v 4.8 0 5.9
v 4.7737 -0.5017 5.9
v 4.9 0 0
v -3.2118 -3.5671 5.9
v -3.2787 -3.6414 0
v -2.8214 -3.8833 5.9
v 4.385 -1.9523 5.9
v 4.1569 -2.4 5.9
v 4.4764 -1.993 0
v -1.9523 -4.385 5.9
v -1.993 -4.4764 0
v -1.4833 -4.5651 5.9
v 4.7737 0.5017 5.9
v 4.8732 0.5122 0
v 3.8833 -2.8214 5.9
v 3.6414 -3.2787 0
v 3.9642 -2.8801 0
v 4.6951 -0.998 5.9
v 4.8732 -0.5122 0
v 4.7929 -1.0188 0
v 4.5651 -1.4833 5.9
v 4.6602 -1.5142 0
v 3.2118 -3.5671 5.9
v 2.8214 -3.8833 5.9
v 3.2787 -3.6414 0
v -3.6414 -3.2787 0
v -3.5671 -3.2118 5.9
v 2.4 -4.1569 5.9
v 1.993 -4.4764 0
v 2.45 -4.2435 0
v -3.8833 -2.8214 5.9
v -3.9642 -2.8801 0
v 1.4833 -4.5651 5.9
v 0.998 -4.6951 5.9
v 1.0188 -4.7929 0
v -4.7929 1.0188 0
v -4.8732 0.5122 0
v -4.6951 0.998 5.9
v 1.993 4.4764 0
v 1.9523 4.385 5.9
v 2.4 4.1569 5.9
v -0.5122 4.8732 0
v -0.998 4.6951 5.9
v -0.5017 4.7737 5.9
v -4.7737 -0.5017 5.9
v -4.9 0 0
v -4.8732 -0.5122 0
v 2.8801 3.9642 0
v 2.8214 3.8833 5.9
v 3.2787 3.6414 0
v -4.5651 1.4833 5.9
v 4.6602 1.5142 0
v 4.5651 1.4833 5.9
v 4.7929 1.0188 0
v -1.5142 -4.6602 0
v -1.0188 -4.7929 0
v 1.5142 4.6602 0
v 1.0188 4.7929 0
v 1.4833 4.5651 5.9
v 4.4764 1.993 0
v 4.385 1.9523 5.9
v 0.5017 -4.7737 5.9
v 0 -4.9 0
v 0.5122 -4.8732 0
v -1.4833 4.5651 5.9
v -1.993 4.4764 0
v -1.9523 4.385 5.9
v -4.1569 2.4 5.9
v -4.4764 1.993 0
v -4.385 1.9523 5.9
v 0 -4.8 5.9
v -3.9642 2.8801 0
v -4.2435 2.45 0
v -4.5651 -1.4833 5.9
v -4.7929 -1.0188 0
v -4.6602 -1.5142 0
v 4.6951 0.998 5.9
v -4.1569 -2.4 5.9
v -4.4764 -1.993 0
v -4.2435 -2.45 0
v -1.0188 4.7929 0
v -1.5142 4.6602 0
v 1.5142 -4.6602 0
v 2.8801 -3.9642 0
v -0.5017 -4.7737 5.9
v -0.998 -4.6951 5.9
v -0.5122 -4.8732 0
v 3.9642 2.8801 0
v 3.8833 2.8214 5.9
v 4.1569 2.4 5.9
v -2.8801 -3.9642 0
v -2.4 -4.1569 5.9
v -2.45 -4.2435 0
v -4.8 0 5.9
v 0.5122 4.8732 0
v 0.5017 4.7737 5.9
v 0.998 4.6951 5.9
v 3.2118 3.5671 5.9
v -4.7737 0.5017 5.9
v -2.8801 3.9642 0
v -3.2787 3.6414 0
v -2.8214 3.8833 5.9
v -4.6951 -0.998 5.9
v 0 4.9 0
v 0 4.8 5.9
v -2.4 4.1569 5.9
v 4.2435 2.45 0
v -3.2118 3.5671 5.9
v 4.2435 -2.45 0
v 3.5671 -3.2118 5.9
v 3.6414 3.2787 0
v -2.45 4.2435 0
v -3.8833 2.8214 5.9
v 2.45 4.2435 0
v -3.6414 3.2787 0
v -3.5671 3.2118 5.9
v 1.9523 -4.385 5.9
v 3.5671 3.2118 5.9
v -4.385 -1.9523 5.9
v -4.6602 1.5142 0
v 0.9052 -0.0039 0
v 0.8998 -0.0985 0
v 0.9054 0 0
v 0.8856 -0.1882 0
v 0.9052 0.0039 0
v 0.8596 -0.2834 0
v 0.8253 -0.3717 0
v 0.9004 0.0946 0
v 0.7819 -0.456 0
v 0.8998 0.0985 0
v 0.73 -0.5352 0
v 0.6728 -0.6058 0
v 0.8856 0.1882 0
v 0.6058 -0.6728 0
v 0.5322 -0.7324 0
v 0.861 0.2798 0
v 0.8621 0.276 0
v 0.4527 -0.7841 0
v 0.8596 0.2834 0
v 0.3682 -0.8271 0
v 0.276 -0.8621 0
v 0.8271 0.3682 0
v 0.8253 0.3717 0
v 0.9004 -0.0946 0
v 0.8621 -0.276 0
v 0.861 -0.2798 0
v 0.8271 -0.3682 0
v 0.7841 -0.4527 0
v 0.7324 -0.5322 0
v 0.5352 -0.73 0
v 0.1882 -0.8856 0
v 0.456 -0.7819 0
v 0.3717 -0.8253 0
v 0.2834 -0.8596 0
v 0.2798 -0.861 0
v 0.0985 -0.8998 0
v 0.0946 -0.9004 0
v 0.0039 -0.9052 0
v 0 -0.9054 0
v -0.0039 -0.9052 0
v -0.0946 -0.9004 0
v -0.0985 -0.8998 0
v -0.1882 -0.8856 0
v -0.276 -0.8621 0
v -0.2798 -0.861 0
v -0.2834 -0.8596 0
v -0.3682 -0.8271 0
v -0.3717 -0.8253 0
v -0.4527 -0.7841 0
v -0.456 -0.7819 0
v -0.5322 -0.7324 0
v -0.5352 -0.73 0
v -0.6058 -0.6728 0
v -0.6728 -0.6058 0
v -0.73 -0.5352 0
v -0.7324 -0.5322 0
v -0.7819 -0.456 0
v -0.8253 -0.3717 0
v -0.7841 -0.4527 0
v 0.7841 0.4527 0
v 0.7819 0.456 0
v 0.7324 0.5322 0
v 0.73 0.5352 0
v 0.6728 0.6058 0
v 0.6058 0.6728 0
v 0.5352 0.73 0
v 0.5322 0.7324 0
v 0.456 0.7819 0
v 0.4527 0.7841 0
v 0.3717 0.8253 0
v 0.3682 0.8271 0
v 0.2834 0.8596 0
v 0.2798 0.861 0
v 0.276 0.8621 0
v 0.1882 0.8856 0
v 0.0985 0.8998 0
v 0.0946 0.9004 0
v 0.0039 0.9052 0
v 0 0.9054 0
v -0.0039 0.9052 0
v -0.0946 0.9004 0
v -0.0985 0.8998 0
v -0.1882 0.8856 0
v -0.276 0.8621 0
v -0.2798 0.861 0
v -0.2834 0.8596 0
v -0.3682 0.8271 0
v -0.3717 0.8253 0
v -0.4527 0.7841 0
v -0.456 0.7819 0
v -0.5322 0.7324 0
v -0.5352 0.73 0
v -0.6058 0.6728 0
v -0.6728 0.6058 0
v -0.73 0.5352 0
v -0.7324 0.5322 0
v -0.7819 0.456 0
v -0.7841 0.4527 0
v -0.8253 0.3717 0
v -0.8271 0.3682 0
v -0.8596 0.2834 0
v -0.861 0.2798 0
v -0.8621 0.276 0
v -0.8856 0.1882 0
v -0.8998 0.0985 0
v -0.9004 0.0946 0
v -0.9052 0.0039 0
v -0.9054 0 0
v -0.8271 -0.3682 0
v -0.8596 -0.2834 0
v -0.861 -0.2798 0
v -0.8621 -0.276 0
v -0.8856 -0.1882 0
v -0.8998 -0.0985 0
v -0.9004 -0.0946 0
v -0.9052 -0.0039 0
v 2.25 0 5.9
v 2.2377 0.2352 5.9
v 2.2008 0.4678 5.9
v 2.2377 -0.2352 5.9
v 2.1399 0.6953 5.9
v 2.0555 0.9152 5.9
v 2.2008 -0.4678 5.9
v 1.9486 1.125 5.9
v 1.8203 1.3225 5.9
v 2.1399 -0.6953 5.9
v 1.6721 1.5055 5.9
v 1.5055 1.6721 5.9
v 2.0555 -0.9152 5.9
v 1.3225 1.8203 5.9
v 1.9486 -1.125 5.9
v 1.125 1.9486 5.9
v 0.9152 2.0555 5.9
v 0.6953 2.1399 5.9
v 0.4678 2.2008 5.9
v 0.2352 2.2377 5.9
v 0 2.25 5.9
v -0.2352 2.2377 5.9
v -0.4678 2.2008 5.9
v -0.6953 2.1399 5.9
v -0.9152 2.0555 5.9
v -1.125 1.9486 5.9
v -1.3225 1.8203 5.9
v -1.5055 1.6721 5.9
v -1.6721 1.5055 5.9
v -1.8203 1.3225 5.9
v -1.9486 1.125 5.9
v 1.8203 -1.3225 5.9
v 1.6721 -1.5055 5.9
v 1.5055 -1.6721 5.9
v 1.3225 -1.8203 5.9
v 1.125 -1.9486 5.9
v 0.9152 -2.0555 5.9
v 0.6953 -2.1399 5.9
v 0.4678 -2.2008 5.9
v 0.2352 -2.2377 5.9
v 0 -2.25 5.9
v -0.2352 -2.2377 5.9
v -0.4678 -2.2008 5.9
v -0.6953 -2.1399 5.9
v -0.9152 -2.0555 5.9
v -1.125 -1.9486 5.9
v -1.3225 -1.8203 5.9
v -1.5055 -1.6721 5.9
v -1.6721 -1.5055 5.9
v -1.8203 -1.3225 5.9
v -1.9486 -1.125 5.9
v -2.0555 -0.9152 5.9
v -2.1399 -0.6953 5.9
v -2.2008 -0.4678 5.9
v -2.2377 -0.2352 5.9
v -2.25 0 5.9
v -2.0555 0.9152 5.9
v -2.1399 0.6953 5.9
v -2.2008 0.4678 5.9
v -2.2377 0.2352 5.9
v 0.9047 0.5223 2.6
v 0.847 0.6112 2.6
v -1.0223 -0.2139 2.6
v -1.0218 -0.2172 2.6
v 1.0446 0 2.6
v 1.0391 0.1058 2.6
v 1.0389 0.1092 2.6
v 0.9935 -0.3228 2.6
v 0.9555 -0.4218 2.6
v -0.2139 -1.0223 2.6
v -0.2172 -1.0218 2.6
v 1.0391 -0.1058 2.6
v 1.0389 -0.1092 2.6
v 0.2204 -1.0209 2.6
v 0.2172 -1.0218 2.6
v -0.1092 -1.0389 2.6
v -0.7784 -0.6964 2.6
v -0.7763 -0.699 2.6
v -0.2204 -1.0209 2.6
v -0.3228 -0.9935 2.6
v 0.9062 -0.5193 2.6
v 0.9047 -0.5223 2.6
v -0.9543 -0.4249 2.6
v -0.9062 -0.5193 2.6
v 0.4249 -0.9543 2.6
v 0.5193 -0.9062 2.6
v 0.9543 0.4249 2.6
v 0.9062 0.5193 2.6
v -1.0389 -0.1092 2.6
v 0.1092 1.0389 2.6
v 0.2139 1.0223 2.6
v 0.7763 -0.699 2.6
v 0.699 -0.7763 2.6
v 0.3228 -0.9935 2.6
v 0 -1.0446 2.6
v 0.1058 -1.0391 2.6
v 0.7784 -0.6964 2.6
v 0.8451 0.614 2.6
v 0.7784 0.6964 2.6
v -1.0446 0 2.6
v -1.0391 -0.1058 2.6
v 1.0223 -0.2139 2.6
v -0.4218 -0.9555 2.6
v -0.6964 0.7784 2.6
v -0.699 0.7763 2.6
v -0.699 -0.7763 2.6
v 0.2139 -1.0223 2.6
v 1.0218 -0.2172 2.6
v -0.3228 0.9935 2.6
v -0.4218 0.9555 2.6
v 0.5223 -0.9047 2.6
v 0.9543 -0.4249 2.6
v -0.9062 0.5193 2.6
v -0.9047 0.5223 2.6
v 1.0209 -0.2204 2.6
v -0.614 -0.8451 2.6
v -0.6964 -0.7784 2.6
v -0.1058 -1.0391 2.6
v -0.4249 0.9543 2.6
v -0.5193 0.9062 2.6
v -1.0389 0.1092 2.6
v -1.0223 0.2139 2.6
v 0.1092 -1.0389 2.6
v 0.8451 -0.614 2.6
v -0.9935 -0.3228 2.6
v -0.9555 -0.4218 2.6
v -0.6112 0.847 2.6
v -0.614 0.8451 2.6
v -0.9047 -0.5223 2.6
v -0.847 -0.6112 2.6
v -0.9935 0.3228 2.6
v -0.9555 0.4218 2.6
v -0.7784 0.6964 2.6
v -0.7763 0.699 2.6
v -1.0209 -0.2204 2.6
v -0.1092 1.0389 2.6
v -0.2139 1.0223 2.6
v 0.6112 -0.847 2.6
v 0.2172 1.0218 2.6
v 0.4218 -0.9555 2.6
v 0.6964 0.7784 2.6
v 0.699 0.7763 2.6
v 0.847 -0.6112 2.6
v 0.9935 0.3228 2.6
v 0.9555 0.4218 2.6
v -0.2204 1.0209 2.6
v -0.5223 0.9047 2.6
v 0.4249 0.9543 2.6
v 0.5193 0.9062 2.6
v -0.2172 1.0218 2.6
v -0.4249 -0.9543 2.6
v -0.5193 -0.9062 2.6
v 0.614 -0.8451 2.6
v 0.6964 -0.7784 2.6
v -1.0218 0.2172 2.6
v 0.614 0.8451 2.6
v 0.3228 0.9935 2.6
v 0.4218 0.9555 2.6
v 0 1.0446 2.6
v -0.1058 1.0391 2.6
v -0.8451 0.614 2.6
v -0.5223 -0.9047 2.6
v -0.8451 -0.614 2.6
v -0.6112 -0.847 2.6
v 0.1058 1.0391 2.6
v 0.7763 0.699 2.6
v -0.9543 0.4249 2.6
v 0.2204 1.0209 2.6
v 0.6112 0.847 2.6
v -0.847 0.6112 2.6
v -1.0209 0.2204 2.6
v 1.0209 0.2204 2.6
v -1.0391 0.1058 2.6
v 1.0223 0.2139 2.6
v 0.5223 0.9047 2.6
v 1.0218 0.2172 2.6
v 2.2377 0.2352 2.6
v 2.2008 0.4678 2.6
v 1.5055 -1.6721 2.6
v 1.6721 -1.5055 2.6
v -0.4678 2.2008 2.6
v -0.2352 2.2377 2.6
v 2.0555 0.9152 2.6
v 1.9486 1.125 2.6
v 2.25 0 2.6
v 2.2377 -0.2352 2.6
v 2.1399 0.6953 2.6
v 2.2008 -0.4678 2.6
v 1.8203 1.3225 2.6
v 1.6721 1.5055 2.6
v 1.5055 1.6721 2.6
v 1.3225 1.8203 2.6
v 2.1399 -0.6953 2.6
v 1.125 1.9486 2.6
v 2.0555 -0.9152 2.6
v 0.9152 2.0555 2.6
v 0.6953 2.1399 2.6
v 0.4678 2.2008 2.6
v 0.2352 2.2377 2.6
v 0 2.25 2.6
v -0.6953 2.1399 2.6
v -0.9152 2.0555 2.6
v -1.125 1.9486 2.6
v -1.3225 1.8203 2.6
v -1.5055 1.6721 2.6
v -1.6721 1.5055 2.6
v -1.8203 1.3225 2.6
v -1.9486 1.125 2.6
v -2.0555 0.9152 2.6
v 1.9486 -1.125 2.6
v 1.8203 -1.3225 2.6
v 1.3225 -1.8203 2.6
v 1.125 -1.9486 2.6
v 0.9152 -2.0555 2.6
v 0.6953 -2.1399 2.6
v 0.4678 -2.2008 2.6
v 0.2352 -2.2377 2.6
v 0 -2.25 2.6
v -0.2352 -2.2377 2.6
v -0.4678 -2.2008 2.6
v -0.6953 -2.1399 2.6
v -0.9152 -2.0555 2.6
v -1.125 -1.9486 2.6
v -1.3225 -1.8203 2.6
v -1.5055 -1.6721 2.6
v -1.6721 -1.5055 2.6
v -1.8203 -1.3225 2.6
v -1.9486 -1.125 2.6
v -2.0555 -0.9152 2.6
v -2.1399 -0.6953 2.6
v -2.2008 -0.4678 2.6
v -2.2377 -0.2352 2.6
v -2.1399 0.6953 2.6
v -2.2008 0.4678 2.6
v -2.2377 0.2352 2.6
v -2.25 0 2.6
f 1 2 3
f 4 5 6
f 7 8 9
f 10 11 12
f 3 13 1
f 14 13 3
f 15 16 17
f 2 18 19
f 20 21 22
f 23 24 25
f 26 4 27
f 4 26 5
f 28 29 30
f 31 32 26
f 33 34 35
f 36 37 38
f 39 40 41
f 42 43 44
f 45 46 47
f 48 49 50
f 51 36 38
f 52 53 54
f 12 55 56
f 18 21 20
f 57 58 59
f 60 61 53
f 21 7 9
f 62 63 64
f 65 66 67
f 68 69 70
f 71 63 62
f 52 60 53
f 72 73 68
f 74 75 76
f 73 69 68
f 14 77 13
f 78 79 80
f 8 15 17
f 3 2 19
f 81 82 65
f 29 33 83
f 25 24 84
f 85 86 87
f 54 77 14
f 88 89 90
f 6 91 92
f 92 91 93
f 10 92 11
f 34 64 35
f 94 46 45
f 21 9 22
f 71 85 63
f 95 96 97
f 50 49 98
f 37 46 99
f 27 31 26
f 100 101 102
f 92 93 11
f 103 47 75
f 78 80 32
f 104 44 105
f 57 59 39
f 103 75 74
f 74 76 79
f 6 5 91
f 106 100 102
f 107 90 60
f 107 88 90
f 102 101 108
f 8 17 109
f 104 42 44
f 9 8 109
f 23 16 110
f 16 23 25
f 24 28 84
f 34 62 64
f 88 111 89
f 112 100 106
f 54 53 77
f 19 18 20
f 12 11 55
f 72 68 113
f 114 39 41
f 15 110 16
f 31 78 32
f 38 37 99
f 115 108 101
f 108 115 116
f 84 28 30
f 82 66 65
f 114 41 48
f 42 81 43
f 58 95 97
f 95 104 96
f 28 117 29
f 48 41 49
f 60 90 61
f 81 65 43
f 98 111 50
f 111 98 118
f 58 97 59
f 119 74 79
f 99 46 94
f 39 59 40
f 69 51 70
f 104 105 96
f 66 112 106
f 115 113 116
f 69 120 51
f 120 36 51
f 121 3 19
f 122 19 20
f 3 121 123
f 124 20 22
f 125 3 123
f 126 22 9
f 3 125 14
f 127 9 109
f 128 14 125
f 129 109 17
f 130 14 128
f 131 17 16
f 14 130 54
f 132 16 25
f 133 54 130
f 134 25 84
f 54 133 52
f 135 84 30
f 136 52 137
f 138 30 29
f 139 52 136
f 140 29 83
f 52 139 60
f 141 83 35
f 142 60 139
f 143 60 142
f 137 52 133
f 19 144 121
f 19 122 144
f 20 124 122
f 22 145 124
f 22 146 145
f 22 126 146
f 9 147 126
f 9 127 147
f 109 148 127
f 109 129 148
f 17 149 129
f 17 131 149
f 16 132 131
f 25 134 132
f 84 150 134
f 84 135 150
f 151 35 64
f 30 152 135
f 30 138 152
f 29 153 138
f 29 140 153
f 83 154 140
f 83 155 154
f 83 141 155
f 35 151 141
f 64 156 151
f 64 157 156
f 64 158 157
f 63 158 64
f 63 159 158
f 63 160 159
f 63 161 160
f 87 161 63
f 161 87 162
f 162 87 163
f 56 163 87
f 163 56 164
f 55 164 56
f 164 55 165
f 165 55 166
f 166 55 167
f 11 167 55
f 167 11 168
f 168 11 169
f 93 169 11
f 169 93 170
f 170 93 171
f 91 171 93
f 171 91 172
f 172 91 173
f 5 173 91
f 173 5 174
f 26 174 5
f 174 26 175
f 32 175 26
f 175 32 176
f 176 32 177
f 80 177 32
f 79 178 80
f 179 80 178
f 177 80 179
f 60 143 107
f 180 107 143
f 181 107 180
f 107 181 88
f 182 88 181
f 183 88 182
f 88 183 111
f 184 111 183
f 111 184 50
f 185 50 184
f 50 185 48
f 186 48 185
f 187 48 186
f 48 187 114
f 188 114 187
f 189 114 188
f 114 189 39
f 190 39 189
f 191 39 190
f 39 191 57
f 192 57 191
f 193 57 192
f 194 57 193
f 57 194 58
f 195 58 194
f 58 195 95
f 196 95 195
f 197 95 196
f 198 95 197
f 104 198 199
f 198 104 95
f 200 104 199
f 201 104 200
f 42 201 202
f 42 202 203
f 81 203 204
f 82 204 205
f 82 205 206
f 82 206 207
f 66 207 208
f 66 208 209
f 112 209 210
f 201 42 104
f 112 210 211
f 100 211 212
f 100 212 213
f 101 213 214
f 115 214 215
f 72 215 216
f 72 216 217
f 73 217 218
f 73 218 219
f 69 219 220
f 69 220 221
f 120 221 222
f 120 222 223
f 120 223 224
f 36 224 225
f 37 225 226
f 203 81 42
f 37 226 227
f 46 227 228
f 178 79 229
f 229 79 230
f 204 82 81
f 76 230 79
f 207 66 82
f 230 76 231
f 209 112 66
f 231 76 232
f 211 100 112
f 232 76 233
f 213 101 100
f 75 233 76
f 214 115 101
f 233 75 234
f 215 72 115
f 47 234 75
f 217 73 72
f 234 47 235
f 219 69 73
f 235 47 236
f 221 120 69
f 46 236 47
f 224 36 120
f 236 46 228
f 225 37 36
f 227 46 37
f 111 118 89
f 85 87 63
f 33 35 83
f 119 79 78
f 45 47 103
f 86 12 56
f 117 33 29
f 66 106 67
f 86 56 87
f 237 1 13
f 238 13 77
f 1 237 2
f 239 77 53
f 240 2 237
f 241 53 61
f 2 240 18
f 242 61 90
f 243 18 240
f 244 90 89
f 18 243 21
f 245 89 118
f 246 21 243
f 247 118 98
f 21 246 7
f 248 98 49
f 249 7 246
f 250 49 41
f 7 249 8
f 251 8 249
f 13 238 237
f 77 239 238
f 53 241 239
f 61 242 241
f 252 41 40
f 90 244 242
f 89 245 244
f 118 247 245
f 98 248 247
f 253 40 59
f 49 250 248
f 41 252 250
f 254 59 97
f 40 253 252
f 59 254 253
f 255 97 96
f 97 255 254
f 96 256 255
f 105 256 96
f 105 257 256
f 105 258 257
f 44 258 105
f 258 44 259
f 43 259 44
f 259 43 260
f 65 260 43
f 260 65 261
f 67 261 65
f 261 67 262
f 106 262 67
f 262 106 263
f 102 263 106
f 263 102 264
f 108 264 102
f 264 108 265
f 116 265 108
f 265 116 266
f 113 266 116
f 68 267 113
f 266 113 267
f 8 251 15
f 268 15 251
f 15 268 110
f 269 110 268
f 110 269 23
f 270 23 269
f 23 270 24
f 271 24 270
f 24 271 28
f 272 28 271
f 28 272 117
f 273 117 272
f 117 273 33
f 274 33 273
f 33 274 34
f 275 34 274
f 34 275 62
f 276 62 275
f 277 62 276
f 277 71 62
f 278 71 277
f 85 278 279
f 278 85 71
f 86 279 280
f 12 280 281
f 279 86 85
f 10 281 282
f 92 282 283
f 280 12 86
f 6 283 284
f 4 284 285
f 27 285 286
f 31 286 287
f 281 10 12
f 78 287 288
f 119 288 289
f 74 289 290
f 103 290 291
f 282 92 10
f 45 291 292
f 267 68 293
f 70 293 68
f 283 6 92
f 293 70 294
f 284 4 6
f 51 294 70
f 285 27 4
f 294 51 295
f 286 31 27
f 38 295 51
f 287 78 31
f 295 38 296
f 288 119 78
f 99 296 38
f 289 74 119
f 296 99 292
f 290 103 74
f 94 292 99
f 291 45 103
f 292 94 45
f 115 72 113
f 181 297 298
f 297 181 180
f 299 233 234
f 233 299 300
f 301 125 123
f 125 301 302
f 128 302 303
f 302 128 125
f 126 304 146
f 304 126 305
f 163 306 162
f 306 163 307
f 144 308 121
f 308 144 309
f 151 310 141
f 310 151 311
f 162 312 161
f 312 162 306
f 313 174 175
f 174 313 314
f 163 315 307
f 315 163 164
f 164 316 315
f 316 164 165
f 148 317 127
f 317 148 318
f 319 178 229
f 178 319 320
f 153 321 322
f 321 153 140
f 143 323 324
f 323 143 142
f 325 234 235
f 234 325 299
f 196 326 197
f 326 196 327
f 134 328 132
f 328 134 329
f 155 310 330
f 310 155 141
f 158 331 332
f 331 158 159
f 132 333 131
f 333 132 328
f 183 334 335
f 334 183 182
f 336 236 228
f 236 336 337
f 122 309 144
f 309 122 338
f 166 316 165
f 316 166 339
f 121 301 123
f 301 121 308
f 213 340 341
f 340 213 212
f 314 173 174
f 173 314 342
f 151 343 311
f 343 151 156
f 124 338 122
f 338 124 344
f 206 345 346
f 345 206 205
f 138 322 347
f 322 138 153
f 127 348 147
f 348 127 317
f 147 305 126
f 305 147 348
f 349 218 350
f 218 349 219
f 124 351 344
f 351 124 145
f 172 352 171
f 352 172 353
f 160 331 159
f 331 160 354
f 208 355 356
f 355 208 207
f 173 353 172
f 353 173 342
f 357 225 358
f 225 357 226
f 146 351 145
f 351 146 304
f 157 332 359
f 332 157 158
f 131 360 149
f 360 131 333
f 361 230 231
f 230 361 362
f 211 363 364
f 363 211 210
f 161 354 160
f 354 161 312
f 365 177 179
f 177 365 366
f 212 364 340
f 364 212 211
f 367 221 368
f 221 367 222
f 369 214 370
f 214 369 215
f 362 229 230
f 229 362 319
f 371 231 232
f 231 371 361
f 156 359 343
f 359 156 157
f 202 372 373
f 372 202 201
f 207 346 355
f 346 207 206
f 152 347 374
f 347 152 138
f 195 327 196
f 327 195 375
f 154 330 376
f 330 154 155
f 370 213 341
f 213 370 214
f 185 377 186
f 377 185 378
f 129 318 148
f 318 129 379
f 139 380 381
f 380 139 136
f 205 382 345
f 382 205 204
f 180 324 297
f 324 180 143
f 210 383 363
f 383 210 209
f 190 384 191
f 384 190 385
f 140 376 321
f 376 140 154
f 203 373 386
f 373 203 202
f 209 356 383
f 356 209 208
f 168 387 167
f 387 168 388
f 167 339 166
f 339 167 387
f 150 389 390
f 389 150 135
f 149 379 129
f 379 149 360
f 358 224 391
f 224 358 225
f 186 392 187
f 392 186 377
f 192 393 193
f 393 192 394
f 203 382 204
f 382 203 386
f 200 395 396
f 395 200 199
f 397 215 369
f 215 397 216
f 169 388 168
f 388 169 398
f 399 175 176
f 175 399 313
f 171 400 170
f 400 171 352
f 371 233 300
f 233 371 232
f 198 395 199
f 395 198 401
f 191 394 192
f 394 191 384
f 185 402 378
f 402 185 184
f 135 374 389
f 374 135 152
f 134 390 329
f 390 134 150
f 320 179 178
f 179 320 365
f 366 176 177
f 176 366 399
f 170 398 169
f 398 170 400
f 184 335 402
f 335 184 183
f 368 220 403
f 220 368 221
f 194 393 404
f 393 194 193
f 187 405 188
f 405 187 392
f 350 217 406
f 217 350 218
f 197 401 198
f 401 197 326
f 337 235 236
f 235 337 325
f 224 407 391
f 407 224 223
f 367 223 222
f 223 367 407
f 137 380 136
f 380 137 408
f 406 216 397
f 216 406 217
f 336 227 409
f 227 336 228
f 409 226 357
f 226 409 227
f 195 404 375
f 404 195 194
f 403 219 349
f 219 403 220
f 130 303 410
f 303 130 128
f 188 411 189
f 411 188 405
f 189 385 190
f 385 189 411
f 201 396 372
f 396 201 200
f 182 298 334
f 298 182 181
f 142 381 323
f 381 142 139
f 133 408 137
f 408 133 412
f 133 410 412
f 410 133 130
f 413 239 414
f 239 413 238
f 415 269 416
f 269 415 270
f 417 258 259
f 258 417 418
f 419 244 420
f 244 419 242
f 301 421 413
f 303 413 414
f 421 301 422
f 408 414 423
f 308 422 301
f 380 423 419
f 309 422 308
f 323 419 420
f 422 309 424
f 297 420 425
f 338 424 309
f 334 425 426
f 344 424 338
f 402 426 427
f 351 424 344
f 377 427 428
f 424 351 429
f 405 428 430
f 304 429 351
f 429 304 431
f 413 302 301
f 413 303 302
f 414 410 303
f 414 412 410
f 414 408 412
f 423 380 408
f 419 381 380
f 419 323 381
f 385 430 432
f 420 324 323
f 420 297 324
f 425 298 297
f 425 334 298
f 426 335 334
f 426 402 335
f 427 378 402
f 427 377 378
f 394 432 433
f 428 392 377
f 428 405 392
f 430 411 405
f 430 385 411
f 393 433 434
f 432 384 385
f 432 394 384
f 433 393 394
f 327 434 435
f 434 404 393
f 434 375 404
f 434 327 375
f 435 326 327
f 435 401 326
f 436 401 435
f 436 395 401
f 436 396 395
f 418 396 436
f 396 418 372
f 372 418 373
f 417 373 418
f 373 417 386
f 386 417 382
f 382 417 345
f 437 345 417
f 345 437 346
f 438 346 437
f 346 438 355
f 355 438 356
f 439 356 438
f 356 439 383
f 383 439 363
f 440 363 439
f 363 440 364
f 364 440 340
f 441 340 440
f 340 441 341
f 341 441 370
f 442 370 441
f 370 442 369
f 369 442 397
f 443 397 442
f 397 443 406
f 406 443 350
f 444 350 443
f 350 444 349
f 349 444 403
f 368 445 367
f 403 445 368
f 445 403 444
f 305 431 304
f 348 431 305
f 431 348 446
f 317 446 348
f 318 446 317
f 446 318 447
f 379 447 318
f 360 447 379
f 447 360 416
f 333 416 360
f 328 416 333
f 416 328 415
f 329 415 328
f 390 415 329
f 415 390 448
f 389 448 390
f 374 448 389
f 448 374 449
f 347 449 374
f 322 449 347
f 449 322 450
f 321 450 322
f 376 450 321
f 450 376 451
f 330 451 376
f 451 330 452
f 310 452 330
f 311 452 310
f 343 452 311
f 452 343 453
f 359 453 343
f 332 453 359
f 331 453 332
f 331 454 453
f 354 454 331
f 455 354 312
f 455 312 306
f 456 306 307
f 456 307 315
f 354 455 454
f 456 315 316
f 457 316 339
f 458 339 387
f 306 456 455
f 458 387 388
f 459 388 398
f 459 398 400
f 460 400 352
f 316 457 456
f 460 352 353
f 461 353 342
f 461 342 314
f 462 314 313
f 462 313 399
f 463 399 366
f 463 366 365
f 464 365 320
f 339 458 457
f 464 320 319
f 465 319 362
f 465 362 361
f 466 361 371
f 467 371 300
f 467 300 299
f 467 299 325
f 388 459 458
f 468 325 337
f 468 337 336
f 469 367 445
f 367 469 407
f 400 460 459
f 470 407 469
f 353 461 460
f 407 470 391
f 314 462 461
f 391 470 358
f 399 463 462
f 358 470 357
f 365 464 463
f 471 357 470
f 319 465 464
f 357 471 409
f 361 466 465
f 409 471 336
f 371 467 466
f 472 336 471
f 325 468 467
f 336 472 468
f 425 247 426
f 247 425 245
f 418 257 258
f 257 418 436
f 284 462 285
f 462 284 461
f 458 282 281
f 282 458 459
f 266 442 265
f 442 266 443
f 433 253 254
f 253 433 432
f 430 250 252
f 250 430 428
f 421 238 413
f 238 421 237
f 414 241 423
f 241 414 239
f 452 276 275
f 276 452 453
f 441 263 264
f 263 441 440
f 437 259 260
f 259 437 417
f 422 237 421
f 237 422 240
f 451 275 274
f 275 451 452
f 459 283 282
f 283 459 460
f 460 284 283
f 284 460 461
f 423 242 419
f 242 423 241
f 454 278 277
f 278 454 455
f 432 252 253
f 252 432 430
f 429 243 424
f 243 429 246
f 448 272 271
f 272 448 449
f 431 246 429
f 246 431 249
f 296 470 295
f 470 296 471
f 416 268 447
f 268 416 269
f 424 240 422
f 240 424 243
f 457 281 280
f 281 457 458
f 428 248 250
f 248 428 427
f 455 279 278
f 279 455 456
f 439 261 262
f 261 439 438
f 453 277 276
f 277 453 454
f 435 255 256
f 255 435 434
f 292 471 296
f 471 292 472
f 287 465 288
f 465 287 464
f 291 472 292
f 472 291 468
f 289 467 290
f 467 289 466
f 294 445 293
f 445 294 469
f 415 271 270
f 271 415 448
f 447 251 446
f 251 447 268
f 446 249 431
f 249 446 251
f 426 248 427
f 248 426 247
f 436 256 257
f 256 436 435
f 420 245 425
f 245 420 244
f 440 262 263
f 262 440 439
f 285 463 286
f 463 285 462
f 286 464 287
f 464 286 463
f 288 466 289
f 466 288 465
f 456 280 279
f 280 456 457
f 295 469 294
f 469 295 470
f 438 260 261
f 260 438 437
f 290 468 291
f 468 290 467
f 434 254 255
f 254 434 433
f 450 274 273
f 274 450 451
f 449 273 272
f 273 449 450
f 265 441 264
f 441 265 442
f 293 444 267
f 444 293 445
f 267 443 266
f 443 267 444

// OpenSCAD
// PowerBook 5xx logic board washer
// Copyright François Revol, 2025

/* [Printing options] */

// Optimize for FDM printers (less supports, larger details)
optimize_fdm = true;

/* [Hidden] */
$fs = $preview ? 0.5 : 0.1;
$fa = $preview ? 12 : 6;


module pb5xx_logicboard_washer() {
    difference() {
        cylinder(d1=9.8,d2=9.6,h=5.9);
        translate([0,0,-0.1]) cylinder(d1=1.8,d2=2.1,h=2.8);
        translate([0,0,2.6]) cylinder(d=4.5,h=3.4);
        if ($preview) cube(10);
    }
}

pb5xx_logicboard_washer();
